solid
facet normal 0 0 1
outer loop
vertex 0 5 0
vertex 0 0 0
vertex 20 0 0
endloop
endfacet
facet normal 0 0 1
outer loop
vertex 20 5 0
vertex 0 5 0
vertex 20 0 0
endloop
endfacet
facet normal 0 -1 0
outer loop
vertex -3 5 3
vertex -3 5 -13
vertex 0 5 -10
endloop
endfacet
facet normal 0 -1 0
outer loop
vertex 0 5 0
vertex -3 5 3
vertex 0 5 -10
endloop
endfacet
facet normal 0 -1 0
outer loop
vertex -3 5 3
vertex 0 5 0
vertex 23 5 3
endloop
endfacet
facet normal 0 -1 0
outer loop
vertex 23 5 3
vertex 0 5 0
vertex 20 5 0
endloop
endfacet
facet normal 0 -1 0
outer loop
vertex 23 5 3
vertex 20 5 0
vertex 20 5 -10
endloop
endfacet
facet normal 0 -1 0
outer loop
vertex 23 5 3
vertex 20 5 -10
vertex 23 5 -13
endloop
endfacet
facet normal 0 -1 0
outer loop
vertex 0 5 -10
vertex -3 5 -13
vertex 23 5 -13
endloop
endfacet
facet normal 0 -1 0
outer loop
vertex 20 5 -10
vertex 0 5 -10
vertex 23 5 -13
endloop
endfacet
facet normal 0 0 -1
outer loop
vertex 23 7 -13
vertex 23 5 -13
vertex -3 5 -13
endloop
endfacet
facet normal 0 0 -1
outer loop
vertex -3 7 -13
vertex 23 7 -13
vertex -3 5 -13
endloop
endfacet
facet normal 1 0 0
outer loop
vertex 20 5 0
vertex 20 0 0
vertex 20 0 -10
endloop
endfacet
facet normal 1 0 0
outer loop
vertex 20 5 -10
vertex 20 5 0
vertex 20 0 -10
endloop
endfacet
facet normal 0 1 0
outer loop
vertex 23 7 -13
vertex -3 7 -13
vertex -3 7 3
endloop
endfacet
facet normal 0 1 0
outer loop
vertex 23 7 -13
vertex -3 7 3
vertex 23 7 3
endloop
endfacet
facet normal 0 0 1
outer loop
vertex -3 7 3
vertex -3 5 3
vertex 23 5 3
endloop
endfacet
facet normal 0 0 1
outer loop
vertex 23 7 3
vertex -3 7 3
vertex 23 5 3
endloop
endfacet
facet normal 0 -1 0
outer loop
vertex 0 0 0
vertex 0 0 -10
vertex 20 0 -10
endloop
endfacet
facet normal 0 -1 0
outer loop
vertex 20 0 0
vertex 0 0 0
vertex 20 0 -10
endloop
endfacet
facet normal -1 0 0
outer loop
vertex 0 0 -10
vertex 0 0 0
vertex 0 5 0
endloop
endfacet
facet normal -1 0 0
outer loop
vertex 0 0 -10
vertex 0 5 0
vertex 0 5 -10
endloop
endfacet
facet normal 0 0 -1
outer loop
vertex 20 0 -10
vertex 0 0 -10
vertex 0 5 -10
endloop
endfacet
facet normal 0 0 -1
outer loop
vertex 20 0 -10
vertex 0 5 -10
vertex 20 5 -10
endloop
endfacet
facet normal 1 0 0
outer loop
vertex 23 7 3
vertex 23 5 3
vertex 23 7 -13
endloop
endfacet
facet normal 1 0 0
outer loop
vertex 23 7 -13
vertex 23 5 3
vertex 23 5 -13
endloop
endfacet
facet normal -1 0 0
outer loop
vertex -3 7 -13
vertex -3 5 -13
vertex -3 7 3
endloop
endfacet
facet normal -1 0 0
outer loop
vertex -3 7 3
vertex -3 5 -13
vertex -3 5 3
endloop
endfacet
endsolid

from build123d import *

# Parameters (mm, degrees)
SKETCH1_W           = 20
SKETCH1_H           = 10
BOSS_EXTRUDE1_DEPTH = 5
BOSS_EXTRUDE2_DEPTH = 2


with BuildPart() as part:
    # Sketch1 → Boss-Extrude1 (new body)
    with BuildSketch(Plane(origin=(0, 0, 0), x_dir=(1, 0, 0), z_dir=(0, 1, 0))):
        with Locations((10, 5)):
            Rectangle(SKETCH1_W, SKETCH1_H)
    extrude(amount=BOSS_EXTRUDE1_DEPTH)

    # Sketch2 → Boss-Extrude2 (add)
    with BuildSketch(Plane(origin=(0, 5, 0), x_dir=(1, 0, 0), z_dir=(0, 1, 0))):
        Polygon((-3, 13), (-3, 10), (-3, -3), (23, -3), (23, 13), align=None)
    extrude(amount=BOSS_EXTRUDE2_DEPTH)


solid = part.part
